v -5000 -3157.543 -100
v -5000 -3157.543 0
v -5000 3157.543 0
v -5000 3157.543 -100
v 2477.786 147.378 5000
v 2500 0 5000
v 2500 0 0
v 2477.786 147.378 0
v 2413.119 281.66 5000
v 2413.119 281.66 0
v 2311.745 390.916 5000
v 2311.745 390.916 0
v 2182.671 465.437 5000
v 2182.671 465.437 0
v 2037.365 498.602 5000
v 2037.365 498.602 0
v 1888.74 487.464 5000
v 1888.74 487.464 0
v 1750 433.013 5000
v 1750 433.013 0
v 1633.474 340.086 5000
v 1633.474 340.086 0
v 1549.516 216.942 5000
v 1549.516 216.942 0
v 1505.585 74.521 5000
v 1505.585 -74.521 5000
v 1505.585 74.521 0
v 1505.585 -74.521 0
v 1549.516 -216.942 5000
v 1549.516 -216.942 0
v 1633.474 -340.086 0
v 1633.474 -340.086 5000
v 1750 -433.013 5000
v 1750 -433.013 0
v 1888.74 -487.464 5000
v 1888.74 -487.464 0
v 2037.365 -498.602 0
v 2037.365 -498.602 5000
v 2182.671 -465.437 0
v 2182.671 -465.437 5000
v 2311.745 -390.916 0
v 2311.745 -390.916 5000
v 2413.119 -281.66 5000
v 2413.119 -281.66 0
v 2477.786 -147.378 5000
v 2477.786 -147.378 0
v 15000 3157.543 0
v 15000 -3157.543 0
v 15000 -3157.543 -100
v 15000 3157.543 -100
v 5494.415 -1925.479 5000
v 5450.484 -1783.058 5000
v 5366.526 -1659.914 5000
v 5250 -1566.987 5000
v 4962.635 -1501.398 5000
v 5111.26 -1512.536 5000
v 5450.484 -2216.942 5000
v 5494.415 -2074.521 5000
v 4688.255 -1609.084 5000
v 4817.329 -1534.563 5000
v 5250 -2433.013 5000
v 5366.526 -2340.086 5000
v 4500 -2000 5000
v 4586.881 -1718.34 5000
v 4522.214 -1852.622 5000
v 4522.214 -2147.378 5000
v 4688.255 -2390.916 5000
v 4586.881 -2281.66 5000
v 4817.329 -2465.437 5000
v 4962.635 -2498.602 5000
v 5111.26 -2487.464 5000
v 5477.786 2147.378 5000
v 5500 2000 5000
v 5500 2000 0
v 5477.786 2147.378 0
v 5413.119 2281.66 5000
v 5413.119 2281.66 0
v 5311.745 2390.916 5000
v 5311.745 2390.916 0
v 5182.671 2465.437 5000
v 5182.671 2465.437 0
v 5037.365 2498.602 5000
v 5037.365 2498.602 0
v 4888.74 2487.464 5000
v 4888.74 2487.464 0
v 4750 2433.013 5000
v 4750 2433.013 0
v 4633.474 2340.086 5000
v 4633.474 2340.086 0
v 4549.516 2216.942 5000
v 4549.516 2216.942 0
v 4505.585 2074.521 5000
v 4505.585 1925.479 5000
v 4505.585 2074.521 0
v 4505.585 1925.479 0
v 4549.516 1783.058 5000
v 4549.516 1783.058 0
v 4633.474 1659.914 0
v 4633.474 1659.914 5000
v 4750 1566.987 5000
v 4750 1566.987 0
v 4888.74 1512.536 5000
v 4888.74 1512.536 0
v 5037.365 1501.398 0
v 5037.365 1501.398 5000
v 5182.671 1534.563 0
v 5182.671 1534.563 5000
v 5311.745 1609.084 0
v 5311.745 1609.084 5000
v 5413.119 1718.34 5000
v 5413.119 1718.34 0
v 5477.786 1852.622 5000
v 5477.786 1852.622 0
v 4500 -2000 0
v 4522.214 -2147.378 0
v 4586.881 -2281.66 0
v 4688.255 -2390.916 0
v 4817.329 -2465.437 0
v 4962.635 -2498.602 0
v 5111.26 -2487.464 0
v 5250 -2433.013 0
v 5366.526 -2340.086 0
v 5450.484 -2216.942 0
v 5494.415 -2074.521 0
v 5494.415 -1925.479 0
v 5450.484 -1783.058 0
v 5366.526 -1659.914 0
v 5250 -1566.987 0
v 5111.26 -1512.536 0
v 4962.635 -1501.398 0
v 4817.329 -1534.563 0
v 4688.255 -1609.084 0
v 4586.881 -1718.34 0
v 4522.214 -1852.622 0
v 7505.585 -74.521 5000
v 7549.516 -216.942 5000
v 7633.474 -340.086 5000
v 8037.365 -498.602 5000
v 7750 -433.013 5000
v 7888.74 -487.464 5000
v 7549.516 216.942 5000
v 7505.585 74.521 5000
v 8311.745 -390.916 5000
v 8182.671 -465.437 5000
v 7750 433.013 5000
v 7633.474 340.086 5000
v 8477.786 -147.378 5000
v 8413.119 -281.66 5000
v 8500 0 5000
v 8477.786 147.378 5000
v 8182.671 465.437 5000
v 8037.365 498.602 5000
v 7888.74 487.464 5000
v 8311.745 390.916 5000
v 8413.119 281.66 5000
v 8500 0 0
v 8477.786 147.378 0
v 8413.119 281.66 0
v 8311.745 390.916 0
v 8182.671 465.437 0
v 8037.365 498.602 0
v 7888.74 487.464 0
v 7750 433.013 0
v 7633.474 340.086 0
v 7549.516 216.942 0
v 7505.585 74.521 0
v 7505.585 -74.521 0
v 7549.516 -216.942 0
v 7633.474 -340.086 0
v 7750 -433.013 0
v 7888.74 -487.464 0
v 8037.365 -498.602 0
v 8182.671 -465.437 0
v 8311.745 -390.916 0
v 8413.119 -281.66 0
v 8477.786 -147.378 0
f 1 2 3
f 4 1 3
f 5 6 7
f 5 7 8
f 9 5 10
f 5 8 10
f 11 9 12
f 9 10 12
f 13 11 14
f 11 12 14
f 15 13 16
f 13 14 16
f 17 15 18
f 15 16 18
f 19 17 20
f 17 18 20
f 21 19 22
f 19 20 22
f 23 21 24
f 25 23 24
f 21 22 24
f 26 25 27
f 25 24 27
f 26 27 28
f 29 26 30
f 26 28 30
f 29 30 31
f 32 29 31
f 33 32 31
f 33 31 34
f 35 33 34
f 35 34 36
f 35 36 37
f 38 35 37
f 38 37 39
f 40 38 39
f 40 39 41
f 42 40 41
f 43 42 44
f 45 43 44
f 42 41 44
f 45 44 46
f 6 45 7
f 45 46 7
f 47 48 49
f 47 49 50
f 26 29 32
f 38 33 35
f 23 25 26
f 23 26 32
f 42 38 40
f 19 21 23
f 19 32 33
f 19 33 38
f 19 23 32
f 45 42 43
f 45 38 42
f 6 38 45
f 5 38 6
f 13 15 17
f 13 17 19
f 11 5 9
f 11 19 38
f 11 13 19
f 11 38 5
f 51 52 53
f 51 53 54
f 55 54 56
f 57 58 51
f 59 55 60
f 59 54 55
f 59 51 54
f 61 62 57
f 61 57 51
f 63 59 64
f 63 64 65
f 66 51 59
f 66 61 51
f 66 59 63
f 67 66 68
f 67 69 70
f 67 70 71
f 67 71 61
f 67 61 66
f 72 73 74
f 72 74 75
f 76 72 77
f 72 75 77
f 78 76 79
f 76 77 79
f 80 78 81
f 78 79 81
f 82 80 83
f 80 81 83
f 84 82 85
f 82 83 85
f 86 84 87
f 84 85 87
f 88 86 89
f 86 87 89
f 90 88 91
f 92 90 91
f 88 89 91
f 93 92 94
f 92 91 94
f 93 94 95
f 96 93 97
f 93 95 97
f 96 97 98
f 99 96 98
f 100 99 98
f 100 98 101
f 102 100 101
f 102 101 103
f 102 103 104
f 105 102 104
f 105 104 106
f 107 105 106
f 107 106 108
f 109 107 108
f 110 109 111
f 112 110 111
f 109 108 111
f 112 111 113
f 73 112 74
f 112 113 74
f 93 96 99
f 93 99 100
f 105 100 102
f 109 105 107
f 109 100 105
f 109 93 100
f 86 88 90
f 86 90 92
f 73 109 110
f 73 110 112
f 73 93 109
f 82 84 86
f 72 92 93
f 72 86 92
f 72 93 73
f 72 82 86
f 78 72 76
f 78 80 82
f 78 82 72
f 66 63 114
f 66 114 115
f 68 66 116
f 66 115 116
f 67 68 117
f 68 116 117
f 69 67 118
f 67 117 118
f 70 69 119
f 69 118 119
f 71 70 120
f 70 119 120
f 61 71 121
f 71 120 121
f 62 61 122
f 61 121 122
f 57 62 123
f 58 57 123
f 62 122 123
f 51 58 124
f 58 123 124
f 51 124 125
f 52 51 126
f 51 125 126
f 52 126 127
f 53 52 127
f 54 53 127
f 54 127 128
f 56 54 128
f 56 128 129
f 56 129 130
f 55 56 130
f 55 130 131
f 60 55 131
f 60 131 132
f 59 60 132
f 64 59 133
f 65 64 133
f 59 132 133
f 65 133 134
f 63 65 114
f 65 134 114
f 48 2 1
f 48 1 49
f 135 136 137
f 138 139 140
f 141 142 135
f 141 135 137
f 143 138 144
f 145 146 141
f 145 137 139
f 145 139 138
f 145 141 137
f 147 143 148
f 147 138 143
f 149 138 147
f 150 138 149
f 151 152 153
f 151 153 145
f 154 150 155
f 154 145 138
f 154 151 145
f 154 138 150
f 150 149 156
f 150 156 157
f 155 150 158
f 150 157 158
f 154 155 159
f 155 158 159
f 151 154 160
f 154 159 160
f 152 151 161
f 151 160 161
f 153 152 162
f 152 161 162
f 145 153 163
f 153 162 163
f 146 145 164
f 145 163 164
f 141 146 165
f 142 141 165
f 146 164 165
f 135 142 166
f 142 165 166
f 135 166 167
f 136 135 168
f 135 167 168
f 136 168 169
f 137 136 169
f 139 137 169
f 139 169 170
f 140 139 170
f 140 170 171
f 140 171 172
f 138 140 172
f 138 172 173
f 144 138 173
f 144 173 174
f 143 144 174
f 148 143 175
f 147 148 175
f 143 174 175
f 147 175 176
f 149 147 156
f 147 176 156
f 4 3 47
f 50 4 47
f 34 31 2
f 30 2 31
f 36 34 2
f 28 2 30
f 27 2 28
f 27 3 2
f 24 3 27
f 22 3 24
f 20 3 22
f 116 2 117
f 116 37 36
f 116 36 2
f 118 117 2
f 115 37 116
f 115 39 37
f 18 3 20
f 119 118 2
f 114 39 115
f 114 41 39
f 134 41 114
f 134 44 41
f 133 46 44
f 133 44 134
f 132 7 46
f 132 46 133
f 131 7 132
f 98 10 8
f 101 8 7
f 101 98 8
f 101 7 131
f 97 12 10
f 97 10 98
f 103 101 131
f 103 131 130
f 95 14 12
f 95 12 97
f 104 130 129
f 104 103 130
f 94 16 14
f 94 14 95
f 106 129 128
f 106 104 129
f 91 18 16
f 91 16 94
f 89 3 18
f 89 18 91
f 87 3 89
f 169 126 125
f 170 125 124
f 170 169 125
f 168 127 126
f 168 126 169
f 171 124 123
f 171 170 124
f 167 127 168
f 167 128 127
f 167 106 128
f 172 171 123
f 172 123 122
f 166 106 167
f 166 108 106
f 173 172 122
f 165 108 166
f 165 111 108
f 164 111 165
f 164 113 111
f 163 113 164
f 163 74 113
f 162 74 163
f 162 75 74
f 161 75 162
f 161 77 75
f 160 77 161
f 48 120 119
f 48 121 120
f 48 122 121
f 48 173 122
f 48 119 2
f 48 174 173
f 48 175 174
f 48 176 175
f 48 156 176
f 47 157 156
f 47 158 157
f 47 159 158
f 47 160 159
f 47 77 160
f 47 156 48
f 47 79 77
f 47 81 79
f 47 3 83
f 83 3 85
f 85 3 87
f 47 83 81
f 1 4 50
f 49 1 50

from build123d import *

# Parameters (mm, degrees)
SKETCH6_W           = 20000
SKETCH6_H           = 6315.085915388
BOSS_EXTRUDE3_DEPTH = 100
SKETCH7_R           = 500
BOSS_EXTRUDE4_DEPTH = 5000


with BuildPart() as part:
    # Sketch6 → Boss-Extrude3 (new body)
    with BuildSketch(Plane.XY):
        with Locations((5000, 0)):
            Rectangle(SKETCH6_W, SKETCH6_H)
    extrude(amount=-BOSS_EXTRUDE3_DEPTH)

    # Sketch7 → Boss-Extrude4 (add)
    with BuildSketch(Plane.XY):
        with Locations((2000, 0)):
            Circle(SKETCH7_R)
        with Locations((8000, 0)):
            Circle(SKETCH7_R)
        with Locations((5000, 2000)):
            Circle(SKETCH7_R)
        with Locations(Location((5000, -2000, 0), (0, 0, 180))):
            Circle(SKETCH7_R)
    extrude(amount=BOSS_EXTRUDE4_DEPTH)


solid = part.part
